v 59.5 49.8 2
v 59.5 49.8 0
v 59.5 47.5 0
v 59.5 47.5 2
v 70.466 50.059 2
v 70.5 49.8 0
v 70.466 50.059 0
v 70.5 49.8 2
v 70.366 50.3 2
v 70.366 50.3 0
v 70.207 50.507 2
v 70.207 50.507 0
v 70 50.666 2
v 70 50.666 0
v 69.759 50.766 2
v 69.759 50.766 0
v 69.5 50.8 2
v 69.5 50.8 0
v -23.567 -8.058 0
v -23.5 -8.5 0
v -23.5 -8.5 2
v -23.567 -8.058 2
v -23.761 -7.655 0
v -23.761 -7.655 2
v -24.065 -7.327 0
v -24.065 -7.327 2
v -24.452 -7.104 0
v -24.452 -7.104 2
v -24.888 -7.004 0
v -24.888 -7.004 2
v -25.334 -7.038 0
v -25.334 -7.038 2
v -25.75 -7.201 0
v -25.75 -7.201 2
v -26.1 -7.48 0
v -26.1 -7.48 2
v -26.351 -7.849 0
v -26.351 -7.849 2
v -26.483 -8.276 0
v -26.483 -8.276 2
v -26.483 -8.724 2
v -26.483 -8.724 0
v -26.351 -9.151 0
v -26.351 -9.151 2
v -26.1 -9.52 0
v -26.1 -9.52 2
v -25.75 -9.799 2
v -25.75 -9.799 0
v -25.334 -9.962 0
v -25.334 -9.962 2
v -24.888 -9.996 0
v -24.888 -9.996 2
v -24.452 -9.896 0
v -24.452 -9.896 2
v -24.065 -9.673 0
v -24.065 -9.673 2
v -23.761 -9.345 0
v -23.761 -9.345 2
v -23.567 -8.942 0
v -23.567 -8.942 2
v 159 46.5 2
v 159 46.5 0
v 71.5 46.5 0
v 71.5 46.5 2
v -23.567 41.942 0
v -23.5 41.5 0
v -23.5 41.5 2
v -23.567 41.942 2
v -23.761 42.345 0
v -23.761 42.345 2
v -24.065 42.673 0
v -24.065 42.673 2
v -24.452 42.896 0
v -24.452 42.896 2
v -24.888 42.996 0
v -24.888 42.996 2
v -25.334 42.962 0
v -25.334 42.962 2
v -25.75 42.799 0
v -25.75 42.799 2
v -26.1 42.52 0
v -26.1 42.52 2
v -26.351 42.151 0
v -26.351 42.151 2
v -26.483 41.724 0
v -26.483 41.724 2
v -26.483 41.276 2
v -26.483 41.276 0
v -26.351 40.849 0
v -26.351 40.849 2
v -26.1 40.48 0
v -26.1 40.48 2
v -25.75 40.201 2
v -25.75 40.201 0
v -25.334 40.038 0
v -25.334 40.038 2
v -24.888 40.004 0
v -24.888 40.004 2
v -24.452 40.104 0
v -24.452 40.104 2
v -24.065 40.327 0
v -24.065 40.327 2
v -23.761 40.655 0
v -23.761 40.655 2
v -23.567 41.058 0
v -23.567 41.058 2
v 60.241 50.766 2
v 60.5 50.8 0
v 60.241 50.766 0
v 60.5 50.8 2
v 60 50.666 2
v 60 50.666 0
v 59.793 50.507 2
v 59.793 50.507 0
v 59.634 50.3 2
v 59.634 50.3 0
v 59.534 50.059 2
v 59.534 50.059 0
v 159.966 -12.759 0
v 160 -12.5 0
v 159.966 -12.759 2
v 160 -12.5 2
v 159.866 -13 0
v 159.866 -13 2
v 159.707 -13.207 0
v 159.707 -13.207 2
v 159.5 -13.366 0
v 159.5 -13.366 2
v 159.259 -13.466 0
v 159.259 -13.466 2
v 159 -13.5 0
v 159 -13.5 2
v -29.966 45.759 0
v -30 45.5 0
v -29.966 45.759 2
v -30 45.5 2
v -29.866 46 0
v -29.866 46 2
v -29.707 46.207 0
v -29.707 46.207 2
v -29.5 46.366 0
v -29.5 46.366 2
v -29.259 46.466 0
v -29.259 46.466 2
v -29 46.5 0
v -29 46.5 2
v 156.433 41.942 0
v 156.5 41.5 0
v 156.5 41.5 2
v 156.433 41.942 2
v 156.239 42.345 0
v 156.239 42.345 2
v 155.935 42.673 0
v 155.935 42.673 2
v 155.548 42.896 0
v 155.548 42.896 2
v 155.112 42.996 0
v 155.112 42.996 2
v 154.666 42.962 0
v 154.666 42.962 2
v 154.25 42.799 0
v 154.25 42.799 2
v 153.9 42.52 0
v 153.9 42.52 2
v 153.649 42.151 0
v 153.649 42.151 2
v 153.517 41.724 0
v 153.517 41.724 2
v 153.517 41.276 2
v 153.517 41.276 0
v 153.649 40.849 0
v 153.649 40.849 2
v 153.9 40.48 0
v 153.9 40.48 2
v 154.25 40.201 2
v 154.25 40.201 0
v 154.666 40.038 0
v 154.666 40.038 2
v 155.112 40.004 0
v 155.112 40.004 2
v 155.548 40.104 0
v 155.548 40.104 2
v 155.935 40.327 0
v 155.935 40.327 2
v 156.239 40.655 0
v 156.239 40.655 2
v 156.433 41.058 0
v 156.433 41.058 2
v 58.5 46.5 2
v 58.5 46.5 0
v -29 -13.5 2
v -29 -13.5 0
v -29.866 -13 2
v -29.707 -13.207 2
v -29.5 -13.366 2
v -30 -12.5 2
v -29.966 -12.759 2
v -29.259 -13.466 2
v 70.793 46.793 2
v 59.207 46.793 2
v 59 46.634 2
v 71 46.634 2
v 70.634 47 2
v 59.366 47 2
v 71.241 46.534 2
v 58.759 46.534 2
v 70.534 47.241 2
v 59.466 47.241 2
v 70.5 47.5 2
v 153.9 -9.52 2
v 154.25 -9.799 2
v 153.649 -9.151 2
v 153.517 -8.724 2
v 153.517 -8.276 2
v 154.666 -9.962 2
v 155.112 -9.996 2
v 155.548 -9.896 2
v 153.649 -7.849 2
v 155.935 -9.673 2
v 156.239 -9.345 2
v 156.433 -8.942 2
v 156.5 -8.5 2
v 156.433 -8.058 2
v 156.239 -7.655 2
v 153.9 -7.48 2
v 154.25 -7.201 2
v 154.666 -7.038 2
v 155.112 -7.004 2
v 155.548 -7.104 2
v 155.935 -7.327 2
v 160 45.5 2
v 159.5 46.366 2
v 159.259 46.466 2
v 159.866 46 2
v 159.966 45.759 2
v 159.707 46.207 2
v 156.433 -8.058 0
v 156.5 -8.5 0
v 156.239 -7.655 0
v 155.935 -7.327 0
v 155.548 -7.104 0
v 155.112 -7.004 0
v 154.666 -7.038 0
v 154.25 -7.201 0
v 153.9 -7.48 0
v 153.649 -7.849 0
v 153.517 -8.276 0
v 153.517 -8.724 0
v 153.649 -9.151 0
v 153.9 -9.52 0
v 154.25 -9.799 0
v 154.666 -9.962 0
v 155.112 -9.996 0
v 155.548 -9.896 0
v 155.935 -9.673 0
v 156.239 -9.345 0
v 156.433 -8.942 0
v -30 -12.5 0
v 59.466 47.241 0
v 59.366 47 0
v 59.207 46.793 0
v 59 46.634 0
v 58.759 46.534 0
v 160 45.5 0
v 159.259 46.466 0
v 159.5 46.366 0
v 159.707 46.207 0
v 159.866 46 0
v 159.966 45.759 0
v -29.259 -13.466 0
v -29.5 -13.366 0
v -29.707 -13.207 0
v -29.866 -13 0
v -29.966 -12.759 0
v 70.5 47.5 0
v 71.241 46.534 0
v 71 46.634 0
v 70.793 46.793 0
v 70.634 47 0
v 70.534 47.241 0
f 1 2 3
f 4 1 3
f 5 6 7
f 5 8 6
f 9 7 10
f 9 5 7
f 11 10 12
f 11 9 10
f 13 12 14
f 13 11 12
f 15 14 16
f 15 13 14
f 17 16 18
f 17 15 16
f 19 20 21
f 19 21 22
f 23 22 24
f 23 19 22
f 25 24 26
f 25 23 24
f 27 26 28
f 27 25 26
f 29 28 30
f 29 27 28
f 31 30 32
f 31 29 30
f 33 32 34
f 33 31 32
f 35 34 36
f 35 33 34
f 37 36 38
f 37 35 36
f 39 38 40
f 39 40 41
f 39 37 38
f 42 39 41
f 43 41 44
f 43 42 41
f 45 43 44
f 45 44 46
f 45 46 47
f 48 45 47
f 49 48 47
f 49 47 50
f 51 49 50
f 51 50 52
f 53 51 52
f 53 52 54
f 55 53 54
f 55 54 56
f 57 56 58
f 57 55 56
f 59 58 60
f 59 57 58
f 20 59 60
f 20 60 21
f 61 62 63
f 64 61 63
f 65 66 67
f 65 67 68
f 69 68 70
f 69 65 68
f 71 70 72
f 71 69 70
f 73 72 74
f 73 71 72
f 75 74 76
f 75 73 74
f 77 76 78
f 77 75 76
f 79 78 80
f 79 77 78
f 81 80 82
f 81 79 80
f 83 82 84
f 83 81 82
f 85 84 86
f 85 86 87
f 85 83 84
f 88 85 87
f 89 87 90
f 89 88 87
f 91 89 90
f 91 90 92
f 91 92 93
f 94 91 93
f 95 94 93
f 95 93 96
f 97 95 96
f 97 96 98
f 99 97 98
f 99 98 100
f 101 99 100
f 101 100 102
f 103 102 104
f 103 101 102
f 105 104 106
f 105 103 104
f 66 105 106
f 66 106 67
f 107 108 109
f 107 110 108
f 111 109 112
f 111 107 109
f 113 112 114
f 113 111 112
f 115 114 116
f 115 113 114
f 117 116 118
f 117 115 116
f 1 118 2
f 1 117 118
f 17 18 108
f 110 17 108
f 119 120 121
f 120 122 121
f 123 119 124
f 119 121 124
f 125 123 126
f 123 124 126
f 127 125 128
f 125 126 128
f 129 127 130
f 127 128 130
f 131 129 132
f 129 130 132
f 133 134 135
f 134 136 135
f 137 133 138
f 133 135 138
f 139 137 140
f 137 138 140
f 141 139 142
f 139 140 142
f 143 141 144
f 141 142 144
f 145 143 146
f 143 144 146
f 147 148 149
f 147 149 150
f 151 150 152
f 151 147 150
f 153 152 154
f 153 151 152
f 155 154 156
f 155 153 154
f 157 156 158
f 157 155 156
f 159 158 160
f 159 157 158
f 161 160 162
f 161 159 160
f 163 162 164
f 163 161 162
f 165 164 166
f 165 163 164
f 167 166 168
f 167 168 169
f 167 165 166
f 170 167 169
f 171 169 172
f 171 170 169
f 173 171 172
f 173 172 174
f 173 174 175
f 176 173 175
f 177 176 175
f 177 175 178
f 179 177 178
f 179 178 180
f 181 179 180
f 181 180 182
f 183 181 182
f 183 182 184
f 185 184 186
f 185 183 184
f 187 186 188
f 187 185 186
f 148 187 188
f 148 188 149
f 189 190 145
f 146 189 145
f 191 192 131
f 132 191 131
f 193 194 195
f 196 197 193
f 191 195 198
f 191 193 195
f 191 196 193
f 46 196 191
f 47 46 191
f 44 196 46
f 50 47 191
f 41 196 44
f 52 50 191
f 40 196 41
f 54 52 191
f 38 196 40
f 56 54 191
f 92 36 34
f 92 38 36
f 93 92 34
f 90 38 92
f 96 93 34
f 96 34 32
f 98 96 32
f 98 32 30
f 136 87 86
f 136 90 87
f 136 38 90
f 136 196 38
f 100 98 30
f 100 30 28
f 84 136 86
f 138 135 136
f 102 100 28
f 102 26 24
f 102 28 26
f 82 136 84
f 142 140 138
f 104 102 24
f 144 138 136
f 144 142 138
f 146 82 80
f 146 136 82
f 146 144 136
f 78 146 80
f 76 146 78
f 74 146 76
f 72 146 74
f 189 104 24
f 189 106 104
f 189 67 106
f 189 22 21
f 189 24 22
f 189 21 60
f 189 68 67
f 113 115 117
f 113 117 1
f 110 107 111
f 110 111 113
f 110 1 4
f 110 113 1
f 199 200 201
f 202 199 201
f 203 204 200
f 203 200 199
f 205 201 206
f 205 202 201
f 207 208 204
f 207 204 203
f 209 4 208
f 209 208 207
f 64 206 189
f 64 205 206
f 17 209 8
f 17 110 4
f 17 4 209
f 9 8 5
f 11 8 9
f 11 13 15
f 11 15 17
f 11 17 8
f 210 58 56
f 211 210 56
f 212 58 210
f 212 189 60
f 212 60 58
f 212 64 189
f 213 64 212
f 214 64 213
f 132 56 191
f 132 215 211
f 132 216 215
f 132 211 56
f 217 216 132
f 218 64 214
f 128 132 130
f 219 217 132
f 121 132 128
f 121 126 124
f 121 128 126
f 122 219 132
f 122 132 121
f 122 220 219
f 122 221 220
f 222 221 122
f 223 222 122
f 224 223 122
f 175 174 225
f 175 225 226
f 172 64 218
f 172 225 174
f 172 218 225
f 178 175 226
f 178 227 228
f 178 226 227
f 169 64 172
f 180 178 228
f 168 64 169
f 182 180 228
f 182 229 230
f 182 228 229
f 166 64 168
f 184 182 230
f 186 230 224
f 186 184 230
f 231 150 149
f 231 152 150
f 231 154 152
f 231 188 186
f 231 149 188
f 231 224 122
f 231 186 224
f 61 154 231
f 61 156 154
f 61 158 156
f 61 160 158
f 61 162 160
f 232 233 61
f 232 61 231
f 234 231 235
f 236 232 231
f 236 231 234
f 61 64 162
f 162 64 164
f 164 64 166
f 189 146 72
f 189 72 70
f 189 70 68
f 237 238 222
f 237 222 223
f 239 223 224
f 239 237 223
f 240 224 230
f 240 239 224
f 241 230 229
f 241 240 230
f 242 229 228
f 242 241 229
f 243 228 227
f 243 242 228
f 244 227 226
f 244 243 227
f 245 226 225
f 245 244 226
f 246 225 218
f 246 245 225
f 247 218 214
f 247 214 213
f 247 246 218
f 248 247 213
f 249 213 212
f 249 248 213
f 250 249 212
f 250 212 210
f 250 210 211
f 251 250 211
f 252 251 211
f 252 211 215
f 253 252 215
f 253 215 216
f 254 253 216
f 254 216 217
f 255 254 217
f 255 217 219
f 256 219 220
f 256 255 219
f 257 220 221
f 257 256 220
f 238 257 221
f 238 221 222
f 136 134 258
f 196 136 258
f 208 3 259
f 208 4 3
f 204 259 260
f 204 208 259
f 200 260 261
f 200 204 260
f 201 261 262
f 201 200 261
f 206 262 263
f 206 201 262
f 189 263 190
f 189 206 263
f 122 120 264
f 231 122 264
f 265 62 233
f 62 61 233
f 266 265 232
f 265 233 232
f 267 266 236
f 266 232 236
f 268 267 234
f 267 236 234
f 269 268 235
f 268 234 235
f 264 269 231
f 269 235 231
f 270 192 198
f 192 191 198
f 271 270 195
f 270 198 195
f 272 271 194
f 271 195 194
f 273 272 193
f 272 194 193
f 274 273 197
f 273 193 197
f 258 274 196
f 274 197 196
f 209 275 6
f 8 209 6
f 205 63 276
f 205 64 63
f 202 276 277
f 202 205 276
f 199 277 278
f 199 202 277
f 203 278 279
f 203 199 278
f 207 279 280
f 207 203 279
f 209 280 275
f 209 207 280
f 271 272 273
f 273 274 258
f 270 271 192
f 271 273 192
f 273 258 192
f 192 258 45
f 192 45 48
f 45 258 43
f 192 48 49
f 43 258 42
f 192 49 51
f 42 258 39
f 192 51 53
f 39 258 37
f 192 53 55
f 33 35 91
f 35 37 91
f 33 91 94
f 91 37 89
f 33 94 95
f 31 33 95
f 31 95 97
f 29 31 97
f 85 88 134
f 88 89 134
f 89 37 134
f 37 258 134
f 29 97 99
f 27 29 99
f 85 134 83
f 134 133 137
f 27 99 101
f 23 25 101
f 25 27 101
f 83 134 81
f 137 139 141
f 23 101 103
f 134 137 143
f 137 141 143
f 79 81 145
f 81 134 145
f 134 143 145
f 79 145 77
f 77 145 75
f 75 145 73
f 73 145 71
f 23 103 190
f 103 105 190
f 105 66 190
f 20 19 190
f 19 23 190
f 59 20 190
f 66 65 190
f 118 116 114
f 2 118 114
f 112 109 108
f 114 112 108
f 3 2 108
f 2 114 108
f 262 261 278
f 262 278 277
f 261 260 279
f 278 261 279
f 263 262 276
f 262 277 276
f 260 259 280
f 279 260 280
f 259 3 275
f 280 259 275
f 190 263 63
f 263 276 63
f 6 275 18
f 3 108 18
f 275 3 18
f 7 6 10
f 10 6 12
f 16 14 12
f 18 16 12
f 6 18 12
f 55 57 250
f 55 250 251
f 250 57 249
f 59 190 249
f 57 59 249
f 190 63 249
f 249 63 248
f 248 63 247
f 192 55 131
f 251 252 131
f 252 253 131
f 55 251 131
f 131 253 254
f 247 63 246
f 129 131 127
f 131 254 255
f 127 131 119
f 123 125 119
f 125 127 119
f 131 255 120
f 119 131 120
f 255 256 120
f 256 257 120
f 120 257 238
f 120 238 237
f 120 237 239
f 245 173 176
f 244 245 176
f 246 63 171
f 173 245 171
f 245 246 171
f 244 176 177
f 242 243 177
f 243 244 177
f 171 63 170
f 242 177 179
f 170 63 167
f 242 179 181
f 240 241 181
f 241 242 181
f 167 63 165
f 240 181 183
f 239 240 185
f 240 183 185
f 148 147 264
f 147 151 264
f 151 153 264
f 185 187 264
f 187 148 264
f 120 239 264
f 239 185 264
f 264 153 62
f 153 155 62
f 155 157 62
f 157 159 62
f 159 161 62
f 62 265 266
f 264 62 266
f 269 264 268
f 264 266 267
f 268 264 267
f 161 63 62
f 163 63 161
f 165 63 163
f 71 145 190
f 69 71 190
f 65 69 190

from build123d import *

# Parameters (mm, degrees)
SKETCH_1_R      = 1.5
EXTRUDE_1_DEPTH = 2
FILLET_1_R      = 1


with BuildPart() as part:
    # 草图1 → 凸台-拉伸1 (new body)
    with BuildSketch(Plane.XY):
        Polygon((160, 46.5), (70.5, 46.5), (70.5, 50.8), (59.5, 50.8), (59.5, 46.5), (-30, 46.5), (-30, -13.5), (160, -13.5), align=None)
        with Locations((-25, 41.5)):
            Circle(SKETCH_1_R, mode=Mode.SUBTRACT)
        with Locations((155, 41.5)):
            Circle(SKETCH_1_R, mode=Mode.SUBTRACT)
        with Locations((-25, -8.5)):
            Circle(SKETCH_1_R, mode=Mode.SUBTRACT)
        with Locations((155, -8.5)):
            Circle(SKETCH_1_R, mode=Mode.SUBTRACT)
    extrude(amount=EXTRUDE_1_DEPTH)

    # 圆角1
    fillet_1_edges = [part.edges().sort_by_distance(p)[0] for p in [
        (59.5, 46.5, 1),
        (59.5, 50.8, 1),
        (70.5, 50.8, 1),
        (70.5, 46.5, 1),
        (160, 46.5, 1),
        (160, -13.5, 1),
        (-30, -13.5, 1),
        (-30, 46.5, 1),
    ]]
    fillet(fillet_1_edges, radius=FILLET_1_R)


solid = part.part
